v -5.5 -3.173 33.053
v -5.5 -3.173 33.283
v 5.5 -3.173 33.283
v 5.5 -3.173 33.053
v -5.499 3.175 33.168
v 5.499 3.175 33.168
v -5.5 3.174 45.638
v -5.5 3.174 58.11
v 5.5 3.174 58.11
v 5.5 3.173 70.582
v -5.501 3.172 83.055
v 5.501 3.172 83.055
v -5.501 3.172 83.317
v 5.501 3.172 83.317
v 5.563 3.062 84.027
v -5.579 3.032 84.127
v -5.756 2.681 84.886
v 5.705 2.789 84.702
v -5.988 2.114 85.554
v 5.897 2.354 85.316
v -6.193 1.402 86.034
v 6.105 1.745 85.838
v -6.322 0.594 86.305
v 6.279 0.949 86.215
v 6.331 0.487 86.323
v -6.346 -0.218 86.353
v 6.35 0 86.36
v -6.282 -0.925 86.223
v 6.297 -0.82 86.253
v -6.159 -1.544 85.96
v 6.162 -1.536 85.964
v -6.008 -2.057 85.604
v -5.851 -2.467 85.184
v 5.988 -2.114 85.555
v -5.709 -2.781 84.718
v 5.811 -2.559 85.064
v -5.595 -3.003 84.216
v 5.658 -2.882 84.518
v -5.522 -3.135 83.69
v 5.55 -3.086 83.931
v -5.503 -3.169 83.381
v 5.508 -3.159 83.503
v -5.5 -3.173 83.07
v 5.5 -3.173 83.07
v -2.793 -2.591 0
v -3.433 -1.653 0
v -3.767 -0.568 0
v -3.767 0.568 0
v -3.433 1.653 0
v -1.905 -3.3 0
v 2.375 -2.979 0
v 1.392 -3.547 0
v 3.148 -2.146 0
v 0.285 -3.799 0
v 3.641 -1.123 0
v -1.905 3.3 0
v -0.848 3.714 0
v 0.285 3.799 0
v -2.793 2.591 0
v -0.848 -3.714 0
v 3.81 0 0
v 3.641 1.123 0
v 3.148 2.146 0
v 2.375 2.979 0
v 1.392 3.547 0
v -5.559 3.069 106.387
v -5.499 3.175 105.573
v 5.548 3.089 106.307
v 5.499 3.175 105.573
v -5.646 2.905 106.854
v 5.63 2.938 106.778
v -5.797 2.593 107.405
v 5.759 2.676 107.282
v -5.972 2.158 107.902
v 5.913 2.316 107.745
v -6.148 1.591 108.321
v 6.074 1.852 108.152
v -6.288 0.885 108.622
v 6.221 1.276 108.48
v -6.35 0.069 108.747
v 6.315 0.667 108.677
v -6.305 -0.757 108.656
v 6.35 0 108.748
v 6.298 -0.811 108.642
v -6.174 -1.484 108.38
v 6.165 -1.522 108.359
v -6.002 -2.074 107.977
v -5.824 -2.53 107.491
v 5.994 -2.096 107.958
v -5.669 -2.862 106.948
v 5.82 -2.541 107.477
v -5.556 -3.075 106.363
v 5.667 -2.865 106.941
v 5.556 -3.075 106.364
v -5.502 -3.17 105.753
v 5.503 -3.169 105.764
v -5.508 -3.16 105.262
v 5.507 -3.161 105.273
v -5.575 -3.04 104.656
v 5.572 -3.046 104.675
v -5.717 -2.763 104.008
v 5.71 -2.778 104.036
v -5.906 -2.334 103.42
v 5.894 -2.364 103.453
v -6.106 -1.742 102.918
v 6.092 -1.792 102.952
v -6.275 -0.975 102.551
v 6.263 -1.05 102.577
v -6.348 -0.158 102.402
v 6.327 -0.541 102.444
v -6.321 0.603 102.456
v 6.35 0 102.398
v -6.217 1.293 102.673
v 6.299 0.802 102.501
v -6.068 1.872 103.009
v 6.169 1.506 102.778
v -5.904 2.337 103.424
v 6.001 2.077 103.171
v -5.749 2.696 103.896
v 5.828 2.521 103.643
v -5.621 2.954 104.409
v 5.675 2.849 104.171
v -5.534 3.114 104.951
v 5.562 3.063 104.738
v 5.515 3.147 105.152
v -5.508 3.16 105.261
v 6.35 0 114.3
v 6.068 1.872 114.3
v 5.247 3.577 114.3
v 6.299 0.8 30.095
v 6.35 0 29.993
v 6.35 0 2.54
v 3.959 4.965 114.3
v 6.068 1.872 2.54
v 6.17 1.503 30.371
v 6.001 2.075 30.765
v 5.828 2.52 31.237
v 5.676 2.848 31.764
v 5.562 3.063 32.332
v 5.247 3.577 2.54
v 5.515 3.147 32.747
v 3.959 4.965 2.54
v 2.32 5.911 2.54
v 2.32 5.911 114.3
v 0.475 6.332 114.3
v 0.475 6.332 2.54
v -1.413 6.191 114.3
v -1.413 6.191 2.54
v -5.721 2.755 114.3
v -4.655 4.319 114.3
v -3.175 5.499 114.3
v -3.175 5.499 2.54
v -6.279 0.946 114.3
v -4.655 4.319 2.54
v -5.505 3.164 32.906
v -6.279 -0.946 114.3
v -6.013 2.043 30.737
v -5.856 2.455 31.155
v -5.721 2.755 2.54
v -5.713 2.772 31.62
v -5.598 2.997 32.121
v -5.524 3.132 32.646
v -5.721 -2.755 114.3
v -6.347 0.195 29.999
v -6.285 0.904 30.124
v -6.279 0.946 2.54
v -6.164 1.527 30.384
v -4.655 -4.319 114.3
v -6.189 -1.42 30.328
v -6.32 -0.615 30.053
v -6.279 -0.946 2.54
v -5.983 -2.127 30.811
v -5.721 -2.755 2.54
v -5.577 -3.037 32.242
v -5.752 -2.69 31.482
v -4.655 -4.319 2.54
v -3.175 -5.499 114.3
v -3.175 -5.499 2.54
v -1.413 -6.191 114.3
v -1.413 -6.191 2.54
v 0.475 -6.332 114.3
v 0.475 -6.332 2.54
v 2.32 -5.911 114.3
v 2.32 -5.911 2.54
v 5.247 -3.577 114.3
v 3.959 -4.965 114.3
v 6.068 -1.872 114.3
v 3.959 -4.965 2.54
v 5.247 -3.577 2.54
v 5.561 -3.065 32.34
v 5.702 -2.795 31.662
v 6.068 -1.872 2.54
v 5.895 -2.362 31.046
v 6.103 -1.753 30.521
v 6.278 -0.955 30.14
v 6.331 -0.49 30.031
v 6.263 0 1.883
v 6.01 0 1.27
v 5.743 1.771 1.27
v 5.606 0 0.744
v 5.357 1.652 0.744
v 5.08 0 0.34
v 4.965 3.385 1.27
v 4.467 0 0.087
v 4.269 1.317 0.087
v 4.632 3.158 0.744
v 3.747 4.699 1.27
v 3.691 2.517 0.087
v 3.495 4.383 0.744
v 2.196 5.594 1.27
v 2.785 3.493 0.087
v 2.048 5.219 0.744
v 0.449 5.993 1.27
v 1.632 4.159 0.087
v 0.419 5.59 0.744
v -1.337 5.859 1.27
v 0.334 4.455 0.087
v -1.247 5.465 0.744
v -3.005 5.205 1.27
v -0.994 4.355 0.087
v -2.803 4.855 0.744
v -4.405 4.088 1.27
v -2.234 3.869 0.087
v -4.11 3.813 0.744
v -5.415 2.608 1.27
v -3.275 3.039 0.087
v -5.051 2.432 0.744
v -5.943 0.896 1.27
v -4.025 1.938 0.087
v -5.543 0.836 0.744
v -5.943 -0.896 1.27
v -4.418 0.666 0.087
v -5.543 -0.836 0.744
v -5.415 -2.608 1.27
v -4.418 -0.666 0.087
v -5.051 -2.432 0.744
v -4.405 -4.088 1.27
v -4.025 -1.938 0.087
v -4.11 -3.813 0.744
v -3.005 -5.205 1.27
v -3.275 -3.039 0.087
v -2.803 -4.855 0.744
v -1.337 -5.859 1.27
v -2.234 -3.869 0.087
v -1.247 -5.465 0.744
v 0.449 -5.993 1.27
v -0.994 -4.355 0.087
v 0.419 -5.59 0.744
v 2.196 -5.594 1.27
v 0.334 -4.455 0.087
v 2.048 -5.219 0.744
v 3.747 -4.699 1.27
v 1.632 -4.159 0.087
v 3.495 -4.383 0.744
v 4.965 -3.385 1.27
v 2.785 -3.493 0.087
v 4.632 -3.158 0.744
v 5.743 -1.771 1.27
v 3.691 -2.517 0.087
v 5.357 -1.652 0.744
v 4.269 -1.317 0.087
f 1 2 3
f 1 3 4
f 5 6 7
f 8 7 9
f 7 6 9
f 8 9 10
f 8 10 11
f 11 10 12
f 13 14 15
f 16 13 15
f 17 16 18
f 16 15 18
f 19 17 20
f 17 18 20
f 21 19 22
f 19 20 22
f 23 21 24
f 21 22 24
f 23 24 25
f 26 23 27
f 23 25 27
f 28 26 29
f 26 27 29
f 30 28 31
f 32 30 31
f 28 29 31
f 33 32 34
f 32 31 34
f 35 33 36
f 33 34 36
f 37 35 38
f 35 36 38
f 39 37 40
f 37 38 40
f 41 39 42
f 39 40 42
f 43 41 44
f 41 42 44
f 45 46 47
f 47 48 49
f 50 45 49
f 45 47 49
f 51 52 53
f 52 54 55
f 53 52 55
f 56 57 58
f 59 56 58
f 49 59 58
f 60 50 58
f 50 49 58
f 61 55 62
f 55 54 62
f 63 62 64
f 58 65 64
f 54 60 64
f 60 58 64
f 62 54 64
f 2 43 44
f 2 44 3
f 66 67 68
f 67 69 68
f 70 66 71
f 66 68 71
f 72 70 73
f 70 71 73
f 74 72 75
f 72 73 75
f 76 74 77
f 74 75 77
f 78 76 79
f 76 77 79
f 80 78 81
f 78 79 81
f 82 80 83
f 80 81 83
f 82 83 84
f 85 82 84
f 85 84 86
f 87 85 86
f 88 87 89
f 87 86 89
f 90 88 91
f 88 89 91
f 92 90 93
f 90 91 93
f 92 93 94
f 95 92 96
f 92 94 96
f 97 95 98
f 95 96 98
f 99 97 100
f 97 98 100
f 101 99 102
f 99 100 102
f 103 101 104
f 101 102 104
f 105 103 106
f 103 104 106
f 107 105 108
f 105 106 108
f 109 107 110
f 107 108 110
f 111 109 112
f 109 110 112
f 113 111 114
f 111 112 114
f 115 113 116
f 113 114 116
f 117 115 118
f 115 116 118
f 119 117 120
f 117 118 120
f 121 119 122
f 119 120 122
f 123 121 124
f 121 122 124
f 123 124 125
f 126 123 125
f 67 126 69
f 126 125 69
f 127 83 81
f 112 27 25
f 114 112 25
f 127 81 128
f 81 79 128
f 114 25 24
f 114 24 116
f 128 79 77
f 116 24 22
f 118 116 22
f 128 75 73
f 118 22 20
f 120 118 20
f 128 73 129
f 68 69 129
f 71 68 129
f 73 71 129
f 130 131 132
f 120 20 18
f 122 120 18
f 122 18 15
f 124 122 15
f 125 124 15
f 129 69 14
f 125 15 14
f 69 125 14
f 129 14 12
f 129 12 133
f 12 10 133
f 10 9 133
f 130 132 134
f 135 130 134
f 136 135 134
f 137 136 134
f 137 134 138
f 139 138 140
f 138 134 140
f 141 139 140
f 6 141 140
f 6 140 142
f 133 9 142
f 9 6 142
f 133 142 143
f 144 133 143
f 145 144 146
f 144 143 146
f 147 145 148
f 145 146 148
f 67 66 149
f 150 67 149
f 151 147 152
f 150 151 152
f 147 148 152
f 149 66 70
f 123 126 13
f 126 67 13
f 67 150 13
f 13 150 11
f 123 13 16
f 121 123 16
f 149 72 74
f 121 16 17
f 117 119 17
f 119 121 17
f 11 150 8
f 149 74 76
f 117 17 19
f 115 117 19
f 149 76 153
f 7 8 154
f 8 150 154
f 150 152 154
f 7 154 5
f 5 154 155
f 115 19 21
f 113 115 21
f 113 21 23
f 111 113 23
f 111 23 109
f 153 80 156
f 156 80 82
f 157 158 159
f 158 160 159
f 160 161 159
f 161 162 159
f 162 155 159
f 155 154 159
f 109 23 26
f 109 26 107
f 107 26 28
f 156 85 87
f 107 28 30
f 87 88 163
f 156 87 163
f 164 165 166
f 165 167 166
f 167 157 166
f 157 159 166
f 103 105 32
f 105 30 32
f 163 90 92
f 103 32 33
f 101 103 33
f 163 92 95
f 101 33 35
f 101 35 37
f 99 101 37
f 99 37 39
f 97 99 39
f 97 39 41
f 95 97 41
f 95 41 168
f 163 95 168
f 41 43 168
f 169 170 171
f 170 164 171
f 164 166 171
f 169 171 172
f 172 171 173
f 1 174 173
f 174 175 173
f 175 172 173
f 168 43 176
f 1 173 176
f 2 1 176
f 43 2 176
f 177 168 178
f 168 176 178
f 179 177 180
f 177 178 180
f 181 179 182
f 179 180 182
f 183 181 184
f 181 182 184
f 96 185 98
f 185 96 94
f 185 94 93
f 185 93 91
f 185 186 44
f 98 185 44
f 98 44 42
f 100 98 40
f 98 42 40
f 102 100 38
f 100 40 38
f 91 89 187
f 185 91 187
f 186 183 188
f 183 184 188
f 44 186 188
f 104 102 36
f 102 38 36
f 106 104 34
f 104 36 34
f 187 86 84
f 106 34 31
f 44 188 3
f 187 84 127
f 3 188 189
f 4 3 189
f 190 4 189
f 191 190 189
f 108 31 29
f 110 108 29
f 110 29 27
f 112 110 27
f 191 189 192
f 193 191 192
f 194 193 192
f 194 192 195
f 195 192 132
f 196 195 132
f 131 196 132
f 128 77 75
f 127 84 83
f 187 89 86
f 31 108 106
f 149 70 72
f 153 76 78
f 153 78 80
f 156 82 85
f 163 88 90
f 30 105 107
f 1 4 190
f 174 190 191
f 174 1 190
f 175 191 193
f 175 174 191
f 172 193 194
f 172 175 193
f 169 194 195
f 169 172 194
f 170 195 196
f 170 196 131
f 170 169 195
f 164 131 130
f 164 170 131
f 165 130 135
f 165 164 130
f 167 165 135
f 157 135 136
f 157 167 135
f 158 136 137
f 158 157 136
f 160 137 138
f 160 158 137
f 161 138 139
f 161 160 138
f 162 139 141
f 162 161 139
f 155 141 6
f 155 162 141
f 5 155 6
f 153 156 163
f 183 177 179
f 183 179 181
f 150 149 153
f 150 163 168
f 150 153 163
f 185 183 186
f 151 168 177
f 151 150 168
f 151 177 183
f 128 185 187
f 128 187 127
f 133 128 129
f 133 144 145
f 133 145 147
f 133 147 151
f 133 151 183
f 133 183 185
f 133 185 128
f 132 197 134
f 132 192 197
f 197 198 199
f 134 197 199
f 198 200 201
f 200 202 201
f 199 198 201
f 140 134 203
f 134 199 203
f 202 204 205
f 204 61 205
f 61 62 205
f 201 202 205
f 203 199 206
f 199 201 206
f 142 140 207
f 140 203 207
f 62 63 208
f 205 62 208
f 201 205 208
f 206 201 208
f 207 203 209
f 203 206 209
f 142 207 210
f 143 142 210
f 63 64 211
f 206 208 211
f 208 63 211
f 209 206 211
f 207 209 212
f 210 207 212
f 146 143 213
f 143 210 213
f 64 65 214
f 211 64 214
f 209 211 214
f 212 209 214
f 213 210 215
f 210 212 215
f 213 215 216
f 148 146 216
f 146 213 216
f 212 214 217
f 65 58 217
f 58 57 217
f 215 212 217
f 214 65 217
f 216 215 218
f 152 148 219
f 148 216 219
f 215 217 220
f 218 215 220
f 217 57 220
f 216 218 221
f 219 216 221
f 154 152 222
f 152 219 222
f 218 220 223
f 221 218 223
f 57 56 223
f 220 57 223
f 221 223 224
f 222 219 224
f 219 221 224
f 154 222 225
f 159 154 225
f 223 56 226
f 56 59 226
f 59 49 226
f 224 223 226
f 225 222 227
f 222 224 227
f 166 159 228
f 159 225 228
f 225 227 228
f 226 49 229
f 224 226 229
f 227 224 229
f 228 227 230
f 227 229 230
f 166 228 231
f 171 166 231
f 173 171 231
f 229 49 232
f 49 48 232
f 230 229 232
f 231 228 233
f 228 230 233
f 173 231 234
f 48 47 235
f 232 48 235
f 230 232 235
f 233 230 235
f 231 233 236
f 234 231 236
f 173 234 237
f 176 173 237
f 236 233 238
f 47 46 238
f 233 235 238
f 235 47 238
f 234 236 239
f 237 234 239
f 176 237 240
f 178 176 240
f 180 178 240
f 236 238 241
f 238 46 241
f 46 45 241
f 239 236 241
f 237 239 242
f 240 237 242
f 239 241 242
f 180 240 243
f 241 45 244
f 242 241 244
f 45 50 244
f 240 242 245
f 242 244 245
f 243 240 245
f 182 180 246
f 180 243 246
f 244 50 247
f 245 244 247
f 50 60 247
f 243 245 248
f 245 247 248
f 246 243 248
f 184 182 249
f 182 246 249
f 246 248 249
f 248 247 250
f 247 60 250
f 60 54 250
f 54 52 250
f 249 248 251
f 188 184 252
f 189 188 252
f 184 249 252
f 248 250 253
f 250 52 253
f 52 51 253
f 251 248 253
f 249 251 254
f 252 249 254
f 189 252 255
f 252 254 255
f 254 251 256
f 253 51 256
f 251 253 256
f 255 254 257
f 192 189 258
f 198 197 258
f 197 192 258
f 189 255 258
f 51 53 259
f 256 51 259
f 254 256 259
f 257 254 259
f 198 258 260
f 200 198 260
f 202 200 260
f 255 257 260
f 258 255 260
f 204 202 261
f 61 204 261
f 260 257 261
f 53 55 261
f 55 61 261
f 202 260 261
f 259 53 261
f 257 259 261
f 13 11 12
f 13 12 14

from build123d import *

# Parameters (mm, degrees)
F0_R     = 6.35
F1_DEPTH = 114.3
F2_R     = 2.54
F4_DEPTH = 12.7
F5_R     = 3.175
F6_DEPTH = 12.7


with BuildPart() as f1:
    # F0 (on Top) → F1 (new body)
    with BuildSketch(Plane.XY):
        Circle(F0_R)
    extrude(amount=F1_DEPTH)

    # F2
    f2_edges = [f1.edges().sort_by_distance(p)[0] for p in [
        (-6.35, 0, 0),
    ]]
    fillet(f2_edges, radius=F2_R)

    # F3 (on Right) → F4 (cut, symmetric)
    with BuildSketch(Plane.YZ):
        with BuildLine():
            Line((3.1722903245, 83.3166194451), (3.1723044783, 83.0546716063))
            ThreePointArc((3.1723044783, 83.0546716063), (3.1749999954, 83.1856456717), (3.1722903245, 83.3166194451))
        make_face()
        with BuildLine():
            Line((3.1749999954, 33.1680122005), (3.1723044783, 83.0546716063))
            Line((3.1723044783, 83.0546716063), (3.1722903245, 83.3166194451))
            ThreePointArc((3.1722903245, 83.3166194451), (-0.0080531428, 86.3604639044), (-3.1729147849, 83.3005252697))
            Line((-3.1729147849, 83.3005252697), (-3.1729147849, 83.0704229654))
            Line((-3.1729147849, 83.0704229654), (-3.1729147849, 33.2828917985))
            Line((-3.1729147849, 33.2828917985), (-3.1729147849, 33.0527894941))
            ThreePointArc((-3.1729147849, 33.0527894941), (0.0576207865, 29.9933635484), (3.1749999954, 33.1680122005))
        make_face()
        with BuildLine():
            Line((-3.1729147849, 83.0704229654), (-3.1729147849, 83.3005252697))
            ThreePointArc((-3.1729147849, 83.3005252697), (-3.175, 83.1854741175), (-3.1729147849, 83.0704229654))
        make_face()
        with BuildLine():
            ThreePointArc((-3.1729147849, 33.2828917985), (-3.175, 33.1678406463), (-3.1729147849, 33.0527894941))
            Line((-3.1729147849, 33.0527894941), (-3.1729147849, 33.2828917985))
        make_face()
    extrude(amount=F4_DEPTH, both=True, mode=Mode.SUBTRACT)

    # F5 (on Right) → F6 (cut, symmetric)
    with BuildSketch(Plane.YZ):
        with Locations((0, 105.5728718638)):
            Circle(F5_R)
    extrude(amount=F6_DEPTH, both=True, mode=Mode.SUBTRACT)


solid = f1.part
